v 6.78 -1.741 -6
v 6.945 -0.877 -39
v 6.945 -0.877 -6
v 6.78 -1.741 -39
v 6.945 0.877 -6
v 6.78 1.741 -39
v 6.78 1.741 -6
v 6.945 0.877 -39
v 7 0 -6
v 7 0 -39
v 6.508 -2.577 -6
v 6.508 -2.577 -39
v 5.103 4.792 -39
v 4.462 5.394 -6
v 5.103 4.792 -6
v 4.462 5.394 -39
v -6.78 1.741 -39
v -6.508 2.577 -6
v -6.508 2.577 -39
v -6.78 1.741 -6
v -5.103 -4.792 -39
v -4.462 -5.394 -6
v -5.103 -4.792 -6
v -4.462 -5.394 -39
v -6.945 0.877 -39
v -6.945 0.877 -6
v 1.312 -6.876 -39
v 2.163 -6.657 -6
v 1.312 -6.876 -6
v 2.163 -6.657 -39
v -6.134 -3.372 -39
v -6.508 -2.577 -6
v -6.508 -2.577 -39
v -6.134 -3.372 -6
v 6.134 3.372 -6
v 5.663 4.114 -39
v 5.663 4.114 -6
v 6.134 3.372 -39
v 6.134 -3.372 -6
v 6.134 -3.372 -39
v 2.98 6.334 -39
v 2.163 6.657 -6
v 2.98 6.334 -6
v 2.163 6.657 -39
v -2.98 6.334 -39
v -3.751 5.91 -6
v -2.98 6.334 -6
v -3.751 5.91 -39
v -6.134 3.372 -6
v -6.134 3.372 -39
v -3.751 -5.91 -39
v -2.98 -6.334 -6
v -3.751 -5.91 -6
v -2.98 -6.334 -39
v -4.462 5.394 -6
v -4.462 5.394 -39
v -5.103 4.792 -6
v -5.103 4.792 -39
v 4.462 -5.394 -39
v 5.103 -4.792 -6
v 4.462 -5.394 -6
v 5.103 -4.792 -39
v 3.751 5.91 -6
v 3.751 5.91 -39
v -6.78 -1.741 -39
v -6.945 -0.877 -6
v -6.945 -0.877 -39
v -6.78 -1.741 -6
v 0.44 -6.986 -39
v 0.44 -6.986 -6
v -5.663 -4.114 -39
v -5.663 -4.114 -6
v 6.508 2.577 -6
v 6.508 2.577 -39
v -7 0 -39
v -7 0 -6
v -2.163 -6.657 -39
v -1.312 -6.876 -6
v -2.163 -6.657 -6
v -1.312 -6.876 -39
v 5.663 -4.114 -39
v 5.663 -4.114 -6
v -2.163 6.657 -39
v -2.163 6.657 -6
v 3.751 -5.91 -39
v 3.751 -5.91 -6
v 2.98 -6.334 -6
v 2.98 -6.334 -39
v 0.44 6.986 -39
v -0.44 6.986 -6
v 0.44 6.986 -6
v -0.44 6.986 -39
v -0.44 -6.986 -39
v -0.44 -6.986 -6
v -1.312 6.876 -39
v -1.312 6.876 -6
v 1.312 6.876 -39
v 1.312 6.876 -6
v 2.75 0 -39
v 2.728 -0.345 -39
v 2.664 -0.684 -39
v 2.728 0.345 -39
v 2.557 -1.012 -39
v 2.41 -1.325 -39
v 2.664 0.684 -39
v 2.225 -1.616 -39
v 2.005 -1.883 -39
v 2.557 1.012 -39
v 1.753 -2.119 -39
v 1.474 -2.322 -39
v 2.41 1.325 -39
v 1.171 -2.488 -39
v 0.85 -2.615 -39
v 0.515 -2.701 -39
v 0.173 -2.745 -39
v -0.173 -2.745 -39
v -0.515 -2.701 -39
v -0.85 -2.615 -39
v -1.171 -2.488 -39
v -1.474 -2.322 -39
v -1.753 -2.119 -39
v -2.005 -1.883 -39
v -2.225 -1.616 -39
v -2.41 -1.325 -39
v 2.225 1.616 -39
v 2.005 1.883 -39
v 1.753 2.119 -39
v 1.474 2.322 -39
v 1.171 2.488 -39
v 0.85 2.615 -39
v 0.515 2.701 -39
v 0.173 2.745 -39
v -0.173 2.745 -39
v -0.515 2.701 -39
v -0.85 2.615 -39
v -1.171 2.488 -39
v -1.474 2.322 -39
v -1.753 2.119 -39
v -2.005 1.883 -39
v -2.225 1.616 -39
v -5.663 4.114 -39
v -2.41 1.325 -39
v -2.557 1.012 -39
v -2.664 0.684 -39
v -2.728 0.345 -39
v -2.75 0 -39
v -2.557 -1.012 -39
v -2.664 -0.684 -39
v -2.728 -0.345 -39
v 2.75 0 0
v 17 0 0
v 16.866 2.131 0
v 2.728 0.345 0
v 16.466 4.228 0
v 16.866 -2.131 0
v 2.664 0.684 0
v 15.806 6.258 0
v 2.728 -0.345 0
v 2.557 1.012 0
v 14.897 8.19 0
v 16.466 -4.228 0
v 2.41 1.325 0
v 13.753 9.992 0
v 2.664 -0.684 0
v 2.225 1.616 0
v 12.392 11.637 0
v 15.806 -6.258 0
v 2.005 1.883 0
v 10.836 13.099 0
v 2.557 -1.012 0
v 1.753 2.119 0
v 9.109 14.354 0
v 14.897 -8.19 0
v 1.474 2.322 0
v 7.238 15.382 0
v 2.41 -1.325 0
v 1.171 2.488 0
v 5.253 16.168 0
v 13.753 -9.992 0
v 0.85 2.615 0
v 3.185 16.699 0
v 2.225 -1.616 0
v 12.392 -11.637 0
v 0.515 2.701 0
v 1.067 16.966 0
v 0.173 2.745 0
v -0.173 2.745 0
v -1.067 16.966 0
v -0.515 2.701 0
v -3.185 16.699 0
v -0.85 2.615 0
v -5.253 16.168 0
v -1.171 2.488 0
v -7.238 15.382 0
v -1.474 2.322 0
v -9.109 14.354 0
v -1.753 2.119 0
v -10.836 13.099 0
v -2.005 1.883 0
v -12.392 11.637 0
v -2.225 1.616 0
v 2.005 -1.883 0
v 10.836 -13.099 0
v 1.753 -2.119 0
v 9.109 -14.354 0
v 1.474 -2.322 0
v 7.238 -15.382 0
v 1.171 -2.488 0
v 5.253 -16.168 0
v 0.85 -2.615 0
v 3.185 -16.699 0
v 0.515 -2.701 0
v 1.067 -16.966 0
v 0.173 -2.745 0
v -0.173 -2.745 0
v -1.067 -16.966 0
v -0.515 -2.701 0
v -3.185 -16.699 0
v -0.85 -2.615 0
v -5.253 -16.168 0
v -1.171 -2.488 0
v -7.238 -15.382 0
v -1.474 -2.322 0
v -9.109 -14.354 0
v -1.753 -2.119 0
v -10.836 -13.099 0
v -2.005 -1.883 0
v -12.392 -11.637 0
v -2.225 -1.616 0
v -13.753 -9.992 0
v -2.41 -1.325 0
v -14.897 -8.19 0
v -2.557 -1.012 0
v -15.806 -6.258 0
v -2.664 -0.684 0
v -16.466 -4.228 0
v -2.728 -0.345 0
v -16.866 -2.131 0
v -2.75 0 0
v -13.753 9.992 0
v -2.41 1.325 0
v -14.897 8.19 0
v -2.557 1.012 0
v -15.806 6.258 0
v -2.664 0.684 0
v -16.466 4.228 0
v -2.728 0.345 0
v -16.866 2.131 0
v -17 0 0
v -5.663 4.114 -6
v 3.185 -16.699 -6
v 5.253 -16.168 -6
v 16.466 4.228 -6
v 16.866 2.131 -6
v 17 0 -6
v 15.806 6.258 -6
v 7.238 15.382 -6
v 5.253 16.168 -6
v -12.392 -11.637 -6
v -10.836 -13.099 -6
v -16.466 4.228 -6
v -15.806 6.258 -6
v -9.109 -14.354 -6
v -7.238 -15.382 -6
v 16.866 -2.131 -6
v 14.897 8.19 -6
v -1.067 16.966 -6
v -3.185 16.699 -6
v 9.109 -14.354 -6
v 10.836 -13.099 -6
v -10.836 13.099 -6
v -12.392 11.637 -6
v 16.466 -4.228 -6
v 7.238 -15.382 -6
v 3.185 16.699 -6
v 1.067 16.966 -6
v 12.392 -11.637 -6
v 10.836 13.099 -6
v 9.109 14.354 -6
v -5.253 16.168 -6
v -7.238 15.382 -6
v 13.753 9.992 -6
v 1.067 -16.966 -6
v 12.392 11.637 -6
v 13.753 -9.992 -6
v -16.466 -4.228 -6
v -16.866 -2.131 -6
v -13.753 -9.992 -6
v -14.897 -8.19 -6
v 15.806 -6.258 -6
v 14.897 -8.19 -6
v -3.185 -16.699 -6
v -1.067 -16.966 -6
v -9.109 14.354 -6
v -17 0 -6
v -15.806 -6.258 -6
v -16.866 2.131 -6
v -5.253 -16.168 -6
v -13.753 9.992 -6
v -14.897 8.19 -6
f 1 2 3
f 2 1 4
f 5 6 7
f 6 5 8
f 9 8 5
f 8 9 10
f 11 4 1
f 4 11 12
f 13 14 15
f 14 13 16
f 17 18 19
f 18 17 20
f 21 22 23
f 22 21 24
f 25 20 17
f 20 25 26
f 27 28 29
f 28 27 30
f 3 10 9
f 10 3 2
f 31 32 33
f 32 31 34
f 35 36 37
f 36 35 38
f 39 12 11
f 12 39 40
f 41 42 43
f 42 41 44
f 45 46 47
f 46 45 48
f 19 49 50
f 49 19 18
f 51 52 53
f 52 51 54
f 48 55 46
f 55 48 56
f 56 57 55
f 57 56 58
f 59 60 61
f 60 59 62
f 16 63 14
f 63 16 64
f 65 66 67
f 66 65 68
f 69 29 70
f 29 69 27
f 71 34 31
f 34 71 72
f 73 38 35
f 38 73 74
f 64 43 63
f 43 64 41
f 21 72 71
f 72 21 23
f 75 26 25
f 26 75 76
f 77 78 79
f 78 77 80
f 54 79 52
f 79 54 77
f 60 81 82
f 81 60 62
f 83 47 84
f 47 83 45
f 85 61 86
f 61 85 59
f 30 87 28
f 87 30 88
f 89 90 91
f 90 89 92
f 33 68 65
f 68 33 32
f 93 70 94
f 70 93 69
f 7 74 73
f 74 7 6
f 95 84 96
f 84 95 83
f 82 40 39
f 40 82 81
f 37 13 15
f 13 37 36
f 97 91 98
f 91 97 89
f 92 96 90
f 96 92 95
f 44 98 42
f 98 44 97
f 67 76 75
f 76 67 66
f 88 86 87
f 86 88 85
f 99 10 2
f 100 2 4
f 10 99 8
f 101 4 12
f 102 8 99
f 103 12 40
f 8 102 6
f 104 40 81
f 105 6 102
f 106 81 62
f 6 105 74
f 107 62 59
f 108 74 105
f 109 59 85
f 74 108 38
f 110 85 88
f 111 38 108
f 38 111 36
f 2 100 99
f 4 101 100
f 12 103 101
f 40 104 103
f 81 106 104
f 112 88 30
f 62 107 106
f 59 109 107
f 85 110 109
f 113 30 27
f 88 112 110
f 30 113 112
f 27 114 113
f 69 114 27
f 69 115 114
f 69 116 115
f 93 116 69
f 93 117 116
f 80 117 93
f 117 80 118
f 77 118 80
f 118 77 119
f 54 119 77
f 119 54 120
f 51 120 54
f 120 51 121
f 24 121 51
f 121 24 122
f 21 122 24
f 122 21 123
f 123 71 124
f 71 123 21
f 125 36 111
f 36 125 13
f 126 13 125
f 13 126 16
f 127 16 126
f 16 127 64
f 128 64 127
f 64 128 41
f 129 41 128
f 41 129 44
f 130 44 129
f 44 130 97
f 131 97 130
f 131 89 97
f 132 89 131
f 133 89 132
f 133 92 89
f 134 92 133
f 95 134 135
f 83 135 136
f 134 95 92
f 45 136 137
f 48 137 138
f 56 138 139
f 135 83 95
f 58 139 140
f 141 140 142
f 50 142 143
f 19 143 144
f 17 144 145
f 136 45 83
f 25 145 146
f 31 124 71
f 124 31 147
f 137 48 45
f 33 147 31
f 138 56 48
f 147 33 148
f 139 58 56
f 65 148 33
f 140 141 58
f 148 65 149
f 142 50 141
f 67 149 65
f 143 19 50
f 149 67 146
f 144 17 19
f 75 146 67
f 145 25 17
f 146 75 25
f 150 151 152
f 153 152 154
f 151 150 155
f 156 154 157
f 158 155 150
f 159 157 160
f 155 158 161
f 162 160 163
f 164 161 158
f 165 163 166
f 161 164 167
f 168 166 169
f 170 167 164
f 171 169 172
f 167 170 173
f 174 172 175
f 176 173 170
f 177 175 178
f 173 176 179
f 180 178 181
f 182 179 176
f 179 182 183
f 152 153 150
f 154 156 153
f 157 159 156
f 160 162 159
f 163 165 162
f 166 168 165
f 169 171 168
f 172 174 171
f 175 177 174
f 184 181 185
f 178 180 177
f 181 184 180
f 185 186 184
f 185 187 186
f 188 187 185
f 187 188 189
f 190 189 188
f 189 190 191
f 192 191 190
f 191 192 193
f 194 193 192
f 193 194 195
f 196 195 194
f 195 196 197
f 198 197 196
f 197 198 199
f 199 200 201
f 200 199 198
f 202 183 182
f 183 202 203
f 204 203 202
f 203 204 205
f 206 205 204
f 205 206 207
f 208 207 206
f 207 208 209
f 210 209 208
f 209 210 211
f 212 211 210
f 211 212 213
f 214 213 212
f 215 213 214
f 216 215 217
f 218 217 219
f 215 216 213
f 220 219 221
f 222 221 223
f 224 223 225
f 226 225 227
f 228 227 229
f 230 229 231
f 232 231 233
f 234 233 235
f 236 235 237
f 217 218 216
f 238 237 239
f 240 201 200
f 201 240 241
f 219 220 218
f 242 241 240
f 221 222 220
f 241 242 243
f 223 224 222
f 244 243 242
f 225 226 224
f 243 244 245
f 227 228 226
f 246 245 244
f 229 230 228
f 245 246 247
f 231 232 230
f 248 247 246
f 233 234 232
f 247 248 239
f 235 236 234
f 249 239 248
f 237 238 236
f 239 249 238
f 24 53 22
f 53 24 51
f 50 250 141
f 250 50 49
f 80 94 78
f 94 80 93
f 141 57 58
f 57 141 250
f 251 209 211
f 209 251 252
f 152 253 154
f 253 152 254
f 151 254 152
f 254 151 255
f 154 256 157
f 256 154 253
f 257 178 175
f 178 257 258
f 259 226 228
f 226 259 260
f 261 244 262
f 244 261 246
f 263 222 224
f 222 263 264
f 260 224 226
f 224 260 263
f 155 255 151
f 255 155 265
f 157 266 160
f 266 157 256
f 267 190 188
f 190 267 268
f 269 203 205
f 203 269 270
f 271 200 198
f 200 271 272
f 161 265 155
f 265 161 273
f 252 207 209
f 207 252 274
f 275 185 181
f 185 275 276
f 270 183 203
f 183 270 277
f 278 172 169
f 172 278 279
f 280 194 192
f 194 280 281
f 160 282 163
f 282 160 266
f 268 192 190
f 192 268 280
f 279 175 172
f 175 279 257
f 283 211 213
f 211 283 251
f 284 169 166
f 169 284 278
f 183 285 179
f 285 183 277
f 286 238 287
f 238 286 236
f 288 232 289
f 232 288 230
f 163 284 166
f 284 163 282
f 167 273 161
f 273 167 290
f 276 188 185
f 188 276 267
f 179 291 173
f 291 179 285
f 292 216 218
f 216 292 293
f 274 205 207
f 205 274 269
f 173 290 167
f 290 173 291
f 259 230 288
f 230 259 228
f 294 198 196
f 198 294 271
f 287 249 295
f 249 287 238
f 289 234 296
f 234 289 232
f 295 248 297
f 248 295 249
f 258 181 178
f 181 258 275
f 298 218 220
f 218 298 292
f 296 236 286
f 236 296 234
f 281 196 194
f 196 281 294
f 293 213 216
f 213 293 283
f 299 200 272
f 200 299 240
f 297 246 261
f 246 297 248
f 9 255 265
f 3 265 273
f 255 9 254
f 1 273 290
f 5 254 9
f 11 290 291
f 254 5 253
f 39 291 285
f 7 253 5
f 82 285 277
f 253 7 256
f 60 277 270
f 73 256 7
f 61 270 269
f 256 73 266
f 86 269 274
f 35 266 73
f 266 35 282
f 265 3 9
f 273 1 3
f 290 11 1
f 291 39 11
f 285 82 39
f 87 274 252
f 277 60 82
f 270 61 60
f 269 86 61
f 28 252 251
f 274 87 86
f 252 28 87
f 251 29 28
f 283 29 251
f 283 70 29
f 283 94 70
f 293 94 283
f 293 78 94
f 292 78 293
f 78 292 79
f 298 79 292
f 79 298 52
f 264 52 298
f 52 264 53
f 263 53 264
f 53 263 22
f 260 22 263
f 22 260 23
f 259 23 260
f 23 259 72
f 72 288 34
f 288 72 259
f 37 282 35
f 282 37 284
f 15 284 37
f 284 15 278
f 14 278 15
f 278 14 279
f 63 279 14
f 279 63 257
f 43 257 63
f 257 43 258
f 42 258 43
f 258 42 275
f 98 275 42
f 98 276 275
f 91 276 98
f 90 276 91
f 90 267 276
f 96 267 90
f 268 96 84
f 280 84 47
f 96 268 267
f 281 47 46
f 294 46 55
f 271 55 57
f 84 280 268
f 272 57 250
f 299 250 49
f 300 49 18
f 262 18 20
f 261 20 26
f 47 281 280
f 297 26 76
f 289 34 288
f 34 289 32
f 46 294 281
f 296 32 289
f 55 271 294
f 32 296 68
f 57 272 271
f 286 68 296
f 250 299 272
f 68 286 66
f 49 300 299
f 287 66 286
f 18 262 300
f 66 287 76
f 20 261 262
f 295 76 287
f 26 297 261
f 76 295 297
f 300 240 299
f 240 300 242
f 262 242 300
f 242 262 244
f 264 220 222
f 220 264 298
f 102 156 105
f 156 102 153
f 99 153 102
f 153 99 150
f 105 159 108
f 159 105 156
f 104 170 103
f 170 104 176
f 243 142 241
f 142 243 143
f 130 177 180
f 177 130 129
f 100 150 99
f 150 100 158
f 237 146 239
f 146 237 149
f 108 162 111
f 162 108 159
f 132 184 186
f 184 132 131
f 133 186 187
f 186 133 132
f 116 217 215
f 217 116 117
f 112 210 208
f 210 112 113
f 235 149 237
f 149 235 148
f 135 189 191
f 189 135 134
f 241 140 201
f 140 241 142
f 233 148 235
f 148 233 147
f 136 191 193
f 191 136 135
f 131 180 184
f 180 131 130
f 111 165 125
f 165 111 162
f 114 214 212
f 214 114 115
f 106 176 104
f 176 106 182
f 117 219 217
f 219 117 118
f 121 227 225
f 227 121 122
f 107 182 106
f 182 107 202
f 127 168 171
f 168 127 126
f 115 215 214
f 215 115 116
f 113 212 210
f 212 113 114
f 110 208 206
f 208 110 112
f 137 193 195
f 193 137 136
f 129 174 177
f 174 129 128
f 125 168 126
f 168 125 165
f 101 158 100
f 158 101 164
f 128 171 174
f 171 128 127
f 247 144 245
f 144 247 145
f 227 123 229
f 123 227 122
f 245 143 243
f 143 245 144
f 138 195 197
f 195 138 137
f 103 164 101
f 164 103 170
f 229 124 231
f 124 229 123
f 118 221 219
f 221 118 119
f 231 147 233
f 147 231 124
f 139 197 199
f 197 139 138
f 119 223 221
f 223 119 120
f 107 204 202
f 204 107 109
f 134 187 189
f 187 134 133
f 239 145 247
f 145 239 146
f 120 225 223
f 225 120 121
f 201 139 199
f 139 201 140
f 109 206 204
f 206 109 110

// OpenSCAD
$fn = 50;


difference() {
	union() {
		translate(v = [0, 0, -39.0000000000]) {
			cylinder(h = 39, r = 7.0000000000);
		}
		translate(v = [0, 0, -6.0000000000]) {
			cylinder(h = 6, r = 17.0000000000);
		}
	}
	union() {
		#translate(v = [0, 0, -39]) {
			cylinder(h = 39, r = 2.7500000000);
		}
	}
}
